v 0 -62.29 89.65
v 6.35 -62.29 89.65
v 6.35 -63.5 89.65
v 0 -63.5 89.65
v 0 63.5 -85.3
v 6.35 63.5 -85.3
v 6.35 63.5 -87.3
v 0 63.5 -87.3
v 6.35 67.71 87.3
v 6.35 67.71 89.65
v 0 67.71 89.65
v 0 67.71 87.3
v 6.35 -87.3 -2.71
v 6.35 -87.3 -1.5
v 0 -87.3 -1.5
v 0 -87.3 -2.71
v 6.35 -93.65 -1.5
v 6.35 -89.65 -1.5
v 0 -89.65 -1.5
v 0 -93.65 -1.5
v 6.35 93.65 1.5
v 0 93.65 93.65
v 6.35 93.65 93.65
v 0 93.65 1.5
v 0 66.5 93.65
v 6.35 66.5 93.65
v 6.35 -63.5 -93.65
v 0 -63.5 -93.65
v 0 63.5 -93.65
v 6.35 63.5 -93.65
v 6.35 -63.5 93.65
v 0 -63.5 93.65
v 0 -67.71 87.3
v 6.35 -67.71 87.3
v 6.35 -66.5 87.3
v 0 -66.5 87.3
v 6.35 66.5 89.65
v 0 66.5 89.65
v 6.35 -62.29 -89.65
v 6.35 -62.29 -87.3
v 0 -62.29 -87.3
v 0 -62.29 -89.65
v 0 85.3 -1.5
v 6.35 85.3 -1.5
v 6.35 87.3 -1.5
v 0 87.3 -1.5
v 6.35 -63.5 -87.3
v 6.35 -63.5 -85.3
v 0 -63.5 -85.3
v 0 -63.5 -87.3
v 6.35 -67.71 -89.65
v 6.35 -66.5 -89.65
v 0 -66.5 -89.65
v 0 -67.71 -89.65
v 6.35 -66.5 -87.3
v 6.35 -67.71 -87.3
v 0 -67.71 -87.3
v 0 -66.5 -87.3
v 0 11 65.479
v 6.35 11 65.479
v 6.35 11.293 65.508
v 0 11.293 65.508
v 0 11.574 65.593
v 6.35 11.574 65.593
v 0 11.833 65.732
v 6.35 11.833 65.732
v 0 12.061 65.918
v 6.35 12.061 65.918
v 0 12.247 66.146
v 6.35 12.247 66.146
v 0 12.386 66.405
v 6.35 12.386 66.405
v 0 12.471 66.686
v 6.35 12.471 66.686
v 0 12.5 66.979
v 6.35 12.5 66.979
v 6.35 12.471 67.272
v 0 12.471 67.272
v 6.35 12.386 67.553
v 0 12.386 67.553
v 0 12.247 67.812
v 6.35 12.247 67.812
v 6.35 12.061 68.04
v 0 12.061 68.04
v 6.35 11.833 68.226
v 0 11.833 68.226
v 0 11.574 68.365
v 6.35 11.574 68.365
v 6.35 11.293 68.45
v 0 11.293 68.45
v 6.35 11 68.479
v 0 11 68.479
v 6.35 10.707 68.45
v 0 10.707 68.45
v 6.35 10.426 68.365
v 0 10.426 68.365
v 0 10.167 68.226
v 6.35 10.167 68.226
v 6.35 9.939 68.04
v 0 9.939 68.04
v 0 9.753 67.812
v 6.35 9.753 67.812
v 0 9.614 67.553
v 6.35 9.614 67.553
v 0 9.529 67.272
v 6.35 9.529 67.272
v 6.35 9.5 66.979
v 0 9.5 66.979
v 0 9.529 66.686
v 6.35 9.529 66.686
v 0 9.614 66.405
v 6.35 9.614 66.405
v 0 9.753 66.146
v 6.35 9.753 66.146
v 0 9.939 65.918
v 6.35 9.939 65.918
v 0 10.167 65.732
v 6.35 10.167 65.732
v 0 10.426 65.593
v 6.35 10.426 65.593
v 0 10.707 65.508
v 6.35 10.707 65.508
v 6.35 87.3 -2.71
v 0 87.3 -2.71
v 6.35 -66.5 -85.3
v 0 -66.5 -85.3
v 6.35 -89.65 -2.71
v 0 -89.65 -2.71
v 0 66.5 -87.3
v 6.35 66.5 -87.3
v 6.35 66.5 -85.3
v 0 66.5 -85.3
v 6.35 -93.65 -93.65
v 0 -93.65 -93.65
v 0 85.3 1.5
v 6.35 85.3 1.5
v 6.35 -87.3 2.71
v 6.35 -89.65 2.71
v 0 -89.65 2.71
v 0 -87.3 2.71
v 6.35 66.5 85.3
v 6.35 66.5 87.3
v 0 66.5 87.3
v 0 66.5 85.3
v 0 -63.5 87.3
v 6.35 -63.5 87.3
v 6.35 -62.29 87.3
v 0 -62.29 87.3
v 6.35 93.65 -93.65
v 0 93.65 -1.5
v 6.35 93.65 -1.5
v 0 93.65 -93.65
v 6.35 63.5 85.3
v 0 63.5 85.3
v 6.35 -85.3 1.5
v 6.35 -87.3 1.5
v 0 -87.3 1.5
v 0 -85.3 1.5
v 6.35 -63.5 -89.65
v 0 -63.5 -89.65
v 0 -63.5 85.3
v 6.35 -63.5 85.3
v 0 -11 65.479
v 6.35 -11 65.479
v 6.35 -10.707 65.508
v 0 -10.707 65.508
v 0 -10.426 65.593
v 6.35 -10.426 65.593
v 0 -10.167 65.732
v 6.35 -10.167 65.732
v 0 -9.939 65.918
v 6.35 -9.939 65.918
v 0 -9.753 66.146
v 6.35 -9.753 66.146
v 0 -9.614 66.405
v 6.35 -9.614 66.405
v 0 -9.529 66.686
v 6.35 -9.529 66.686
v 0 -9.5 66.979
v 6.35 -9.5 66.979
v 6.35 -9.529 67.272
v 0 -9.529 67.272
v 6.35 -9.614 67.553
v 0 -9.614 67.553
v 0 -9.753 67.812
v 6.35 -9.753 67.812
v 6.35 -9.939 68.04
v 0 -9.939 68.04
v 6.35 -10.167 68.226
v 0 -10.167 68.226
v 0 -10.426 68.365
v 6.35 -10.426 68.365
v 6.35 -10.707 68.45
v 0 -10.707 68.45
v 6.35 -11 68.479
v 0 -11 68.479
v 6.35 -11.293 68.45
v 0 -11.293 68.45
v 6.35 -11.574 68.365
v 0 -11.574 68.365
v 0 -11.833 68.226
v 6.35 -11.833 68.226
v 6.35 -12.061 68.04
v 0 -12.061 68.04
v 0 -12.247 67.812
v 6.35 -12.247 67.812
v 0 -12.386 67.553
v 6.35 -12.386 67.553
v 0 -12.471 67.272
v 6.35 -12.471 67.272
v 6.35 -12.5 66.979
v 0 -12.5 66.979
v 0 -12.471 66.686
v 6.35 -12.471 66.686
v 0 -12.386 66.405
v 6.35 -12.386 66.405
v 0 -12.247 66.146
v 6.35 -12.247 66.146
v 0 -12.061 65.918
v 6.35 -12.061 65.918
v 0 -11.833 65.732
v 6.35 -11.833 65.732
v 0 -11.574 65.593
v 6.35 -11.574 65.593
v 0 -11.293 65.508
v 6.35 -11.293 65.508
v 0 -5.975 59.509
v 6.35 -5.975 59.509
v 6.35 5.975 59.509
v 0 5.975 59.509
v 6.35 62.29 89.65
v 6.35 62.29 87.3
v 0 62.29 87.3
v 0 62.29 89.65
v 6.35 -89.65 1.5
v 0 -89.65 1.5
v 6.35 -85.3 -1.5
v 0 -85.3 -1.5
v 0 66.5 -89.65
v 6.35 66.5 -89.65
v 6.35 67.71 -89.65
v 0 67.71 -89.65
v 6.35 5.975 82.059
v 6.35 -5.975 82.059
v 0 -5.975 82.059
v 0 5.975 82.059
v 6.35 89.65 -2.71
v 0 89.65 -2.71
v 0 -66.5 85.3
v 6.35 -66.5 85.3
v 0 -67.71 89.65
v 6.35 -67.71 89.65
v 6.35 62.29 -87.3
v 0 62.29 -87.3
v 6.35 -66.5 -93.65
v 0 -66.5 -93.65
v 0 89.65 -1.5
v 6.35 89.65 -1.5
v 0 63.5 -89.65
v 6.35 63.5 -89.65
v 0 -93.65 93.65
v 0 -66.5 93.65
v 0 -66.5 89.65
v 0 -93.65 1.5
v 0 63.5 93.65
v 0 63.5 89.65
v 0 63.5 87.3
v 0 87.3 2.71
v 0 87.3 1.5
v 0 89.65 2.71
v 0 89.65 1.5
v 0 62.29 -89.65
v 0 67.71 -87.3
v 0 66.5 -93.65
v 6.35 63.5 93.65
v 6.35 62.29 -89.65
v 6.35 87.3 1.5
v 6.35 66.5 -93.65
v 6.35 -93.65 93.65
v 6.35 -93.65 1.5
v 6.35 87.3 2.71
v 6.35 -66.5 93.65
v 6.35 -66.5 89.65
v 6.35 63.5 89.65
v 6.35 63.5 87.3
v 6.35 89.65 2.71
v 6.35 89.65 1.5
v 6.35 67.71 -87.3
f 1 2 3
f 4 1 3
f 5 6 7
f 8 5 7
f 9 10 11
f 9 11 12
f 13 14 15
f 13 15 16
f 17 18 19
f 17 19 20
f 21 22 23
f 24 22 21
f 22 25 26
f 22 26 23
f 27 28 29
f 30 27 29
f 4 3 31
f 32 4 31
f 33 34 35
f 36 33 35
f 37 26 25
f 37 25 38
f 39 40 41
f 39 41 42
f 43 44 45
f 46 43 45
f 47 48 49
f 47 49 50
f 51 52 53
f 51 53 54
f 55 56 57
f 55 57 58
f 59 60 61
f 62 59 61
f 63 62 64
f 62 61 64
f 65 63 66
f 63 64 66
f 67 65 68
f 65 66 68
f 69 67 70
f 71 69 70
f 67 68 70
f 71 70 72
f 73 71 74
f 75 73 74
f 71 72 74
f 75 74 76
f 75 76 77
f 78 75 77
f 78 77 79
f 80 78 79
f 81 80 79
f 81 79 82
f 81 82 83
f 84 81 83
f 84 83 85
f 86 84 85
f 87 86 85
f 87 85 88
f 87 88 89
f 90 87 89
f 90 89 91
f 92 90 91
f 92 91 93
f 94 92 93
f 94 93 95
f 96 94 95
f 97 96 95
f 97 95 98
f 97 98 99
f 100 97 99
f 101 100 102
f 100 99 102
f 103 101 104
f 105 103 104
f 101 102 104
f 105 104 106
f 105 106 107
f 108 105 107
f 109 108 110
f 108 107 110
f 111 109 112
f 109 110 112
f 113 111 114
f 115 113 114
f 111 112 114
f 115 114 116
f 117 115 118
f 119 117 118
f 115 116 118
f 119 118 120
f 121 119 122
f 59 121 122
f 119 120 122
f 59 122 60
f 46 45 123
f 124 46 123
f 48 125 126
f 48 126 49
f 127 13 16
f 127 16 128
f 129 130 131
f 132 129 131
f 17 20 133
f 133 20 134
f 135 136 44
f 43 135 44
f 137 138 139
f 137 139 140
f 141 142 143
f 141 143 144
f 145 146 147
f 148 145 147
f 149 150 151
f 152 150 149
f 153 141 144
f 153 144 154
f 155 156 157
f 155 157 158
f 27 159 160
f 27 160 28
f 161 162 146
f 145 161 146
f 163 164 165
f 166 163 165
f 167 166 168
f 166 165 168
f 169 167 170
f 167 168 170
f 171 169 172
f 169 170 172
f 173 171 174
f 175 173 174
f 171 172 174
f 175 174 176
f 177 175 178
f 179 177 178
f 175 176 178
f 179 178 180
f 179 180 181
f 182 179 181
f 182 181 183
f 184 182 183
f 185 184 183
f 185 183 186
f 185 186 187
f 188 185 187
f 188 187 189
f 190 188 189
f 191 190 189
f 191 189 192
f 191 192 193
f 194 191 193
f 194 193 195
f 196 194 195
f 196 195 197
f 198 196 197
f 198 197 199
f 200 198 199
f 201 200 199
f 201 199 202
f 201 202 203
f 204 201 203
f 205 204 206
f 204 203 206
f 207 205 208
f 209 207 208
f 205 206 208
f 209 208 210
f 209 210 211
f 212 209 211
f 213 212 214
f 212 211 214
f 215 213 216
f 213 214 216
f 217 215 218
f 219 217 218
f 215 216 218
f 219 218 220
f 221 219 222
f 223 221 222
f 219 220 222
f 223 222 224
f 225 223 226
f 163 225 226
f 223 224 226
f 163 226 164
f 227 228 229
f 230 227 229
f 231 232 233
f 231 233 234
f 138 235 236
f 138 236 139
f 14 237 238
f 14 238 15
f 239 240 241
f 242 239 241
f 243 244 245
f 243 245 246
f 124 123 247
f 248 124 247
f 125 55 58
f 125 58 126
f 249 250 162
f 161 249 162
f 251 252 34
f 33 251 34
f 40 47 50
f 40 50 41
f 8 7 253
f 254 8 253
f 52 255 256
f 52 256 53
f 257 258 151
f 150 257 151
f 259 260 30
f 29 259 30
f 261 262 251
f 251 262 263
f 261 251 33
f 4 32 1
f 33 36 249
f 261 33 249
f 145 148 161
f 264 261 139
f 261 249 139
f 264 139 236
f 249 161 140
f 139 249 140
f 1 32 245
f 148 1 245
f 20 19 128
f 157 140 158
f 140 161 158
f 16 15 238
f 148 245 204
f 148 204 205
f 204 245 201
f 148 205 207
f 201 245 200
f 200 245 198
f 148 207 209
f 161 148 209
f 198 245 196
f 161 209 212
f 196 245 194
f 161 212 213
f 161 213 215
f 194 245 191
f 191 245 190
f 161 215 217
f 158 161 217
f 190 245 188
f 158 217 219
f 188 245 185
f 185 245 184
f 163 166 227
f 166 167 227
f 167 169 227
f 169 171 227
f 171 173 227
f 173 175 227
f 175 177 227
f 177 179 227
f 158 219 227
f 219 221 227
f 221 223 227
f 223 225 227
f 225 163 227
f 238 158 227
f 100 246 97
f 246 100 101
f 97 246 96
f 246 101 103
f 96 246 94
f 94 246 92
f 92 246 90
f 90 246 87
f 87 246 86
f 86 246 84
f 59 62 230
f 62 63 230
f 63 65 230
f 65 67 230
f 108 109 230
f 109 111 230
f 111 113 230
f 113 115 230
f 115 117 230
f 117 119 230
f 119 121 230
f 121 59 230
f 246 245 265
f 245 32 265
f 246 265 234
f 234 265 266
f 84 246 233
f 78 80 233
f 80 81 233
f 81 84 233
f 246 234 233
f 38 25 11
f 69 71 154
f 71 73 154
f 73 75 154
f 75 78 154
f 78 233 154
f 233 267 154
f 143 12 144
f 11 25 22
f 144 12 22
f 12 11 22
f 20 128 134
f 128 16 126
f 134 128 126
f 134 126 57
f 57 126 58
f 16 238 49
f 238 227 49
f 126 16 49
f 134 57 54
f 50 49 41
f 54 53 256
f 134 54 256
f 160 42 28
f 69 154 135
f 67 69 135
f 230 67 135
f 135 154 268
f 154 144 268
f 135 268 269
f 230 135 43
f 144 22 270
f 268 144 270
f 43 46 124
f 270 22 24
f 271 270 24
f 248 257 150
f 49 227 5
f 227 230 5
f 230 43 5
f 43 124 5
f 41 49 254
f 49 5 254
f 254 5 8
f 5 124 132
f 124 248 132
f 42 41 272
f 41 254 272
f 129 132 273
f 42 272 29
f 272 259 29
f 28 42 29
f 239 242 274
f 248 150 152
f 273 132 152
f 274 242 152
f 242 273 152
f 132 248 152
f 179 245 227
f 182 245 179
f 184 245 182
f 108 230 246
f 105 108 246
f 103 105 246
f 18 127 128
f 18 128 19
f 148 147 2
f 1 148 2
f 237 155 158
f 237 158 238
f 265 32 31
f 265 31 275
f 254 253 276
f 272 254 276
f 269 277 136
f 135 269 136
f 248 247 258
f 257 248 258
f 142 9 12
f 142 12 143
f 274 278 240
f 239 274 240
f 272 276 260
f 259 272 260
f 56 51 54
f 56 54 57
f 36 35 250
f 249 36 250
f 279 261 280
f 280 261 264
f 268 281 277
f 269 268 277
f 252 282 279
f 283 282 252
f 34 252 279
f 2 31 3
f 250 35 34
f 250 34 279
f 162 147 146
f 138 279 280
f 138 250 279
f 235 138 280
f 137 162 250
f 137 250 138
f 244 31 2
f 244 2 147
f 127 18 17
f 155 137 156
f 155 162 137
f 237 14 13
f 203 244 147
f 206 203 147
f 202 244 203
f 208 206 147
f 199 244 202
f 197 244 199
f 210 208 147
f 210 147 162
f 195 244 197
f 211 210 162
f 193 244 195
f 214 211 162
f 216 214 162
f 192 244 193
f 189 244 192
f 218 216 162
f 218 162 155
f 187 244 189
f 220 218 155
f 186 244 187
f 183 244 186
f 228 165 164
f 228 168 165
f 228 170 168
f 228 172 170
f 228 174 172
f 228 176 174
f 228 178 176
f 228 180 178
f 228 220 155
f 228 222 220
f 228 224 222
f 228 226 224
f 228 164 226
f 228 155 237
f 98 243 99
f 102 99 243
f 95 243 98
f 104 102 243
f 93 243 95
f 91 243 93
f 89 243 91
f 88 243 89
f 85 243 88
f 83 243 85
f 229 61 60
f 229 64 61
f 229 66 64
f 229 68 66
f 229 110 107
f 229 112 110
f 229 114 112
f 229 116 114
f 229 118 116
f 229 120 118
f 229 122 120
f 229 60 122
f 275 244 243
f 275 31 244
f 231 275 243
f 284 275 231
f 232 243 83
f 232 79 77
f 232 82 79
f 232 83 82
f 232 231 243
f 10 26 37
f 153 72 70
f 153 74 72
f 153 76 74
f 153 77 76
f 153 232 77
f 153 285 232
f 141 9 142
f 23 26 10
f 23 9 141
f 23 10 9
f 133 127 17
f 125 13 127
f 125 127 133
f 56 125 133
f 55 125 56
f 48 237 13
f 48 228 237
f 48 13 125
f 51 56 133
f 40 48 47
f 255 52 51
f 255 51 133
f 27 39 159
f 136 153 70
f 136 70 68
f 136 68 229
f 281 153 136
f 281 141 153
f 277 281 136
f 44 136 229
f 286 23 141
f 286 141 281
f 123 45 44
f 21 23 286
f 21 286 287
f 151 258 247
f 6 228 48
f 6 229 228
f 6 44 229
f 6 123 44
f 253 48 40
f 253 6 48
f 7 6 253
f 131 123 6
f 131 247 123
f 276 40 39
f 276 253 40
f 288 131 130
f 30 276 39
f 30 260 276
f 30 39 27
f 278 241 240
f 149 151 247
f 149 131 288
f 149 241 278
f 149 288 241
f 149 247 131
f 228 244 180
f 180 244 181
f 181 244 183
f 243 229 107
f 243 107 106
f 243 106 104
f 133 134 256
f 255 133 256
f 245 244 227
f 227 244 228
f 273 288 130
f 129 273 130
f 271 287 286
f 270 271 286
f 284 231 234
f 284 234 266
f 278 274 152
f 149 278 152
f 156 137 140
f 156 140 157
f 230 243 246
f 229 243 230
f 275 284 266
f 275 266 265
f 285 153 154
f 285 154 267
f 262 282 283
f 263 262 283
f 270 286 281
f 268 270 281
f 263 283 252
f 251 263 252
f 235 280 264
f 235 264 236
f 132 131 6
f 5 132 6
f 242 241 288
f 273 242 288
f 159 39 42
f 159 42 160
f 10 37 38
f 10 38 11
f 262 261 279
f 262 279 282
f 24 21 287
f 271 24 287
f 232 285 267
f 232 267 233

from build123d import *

# Parameters (mm, degrees)
SKETCH1_W           = 187.3
SKETCH1_H           = 187.3
BOSS_EXTRUDE1_DEPTH = 6.35
SKETCH2_W           = 22.55
SKETCH2_H           = 11.95
CUT_EXTRUDE1_DEPTH  = 6.35
SKETCH3_R           = 1.5
CUT_EXTRUDE2_DEPTH  = 7.35
CUT_EXTRUDE3_DEPTH  = 7.35


with BuildPart() as part:
    # Sketch1 → Boss-Extrude1 (new body)
    with BuildSketch(Plane(origin=(0, 0, 0), x_dir=(0, 0, -1), z_dir=(1, 0, 0))):
        Rectangle(SKETCH1_W, SKETCH1_H)
    extrude(amount=BOSS_EXTRUDE1_DEPTH)

    # Sketch2 → Cut-Extrude1 (cut)
    with BuildSketch(Plane(origin=(6.35, 0, 0), x_dir=(0, 0, -1), z_dir=(1, 0, 0))):
        with Locations((-70.783988916, 0)):
            Rectangle(SKETCH2_W, SKETCH2_H)
    extrude(amount=-CUT_EXTRUDE1_DEPTH, mode=Mode.SUBTRACT)

    # Sketch3 → Cut-Extrude2 (cut, through all)
    with BuildSketch(Plane(origin=(6.35, 0, 0), x_dir=(0, 0, -1), z_dir=(1, 0, 0))):
        with Locations((-66.978988916, 11)):
            Circle(SKETCH3_R)
        with Locations((-66.978988916, -11)):
            Circle(SKETCH3_R)
    extrude(amount=-CUT_EXTRUDE2_DEPTH, mode=Mode.SUBTRACT)

    # Sketch4 → Cut-Extrude3 (cut, through all)
    with BuildSketch(Plane(origin=(6.35, 0, 0), x_dir=(0, 0, -1), z_dir=(1, 0, 0))):
        Polygon((-93.65, 66.5), (-89.65, 66.5), (-89.65, 67.71), (-87.3, 67.71), (-87.3, 66.5), (-85.3, 66.5), (-85.3, 63.5), (-87.3, 63.5), (-87.3, 62.29), (-89.65, 62.29), (-89.65, 63.5), (-93.65, 63.5), align=None)
        Polygon((-87.3, -63.5), (-87.3, -62.29), (-89.65, -62.29), (-89.65, -63.5), (-93.65, -63.5), (-93.65, -66.5), (-89.65, -66.5), (-89.65, -67.71), (-87.3, -67.71), (-87.3, -66.5), (-85.3, -66.5), (-85.3, -63.5), align=None)
        Polygon((93.65, -66.5), (89.65, -66.5), (89.65, -67.71), (87.3, -67.71), (87.3, -66.5), (85.3, -66.5), (85.3, -63.5), (87.3, -63.5), (87.3, -62.29), (89.65, -62.29), (89.65, -63.5), (93.65, -63.5), align=None)
        Polygon((87.3, 63.5), (87.3, 62.29), (89.65, 62.29), (89.65, 63.5), (93.65, 63.5), (93.65, 66.5), (89.65, 66.5), (89.65, 67.71), (87.3, 67.71), (87.3, 66.5), (85.3, 66.5), (85.3, 63.5), align=None)
        Polygon((-1.5, 93.65), (-1.5, 89.65), (-2.71, 89.65), (-2.71, 87.3), (-1.5, 87.3), (-1.5, 85.3), (1.5, 85.3), (1.5, 87.3), (2.71, 87.3), (2.71, 89.65), (1.5, 89.65), (1.5, 93.65), align=None)
        Polygon((-2.71, -87.3), (-1.5, -87.3), (-1.5, -85.3), (1.5, -85.3), (1.5, -87.3), (2.71, -87.3), (2.71, -89.65), (1.5, -89.65), (1.5, -93.65), (-1.5, -93.65), (-1.5, -89.65), (-2.71, -89.65), align=None)
    extrude(amount=-CUT_EXTRUDE3_DEPTH, mode=Mode.SUBTRACT)


solid = part.part
